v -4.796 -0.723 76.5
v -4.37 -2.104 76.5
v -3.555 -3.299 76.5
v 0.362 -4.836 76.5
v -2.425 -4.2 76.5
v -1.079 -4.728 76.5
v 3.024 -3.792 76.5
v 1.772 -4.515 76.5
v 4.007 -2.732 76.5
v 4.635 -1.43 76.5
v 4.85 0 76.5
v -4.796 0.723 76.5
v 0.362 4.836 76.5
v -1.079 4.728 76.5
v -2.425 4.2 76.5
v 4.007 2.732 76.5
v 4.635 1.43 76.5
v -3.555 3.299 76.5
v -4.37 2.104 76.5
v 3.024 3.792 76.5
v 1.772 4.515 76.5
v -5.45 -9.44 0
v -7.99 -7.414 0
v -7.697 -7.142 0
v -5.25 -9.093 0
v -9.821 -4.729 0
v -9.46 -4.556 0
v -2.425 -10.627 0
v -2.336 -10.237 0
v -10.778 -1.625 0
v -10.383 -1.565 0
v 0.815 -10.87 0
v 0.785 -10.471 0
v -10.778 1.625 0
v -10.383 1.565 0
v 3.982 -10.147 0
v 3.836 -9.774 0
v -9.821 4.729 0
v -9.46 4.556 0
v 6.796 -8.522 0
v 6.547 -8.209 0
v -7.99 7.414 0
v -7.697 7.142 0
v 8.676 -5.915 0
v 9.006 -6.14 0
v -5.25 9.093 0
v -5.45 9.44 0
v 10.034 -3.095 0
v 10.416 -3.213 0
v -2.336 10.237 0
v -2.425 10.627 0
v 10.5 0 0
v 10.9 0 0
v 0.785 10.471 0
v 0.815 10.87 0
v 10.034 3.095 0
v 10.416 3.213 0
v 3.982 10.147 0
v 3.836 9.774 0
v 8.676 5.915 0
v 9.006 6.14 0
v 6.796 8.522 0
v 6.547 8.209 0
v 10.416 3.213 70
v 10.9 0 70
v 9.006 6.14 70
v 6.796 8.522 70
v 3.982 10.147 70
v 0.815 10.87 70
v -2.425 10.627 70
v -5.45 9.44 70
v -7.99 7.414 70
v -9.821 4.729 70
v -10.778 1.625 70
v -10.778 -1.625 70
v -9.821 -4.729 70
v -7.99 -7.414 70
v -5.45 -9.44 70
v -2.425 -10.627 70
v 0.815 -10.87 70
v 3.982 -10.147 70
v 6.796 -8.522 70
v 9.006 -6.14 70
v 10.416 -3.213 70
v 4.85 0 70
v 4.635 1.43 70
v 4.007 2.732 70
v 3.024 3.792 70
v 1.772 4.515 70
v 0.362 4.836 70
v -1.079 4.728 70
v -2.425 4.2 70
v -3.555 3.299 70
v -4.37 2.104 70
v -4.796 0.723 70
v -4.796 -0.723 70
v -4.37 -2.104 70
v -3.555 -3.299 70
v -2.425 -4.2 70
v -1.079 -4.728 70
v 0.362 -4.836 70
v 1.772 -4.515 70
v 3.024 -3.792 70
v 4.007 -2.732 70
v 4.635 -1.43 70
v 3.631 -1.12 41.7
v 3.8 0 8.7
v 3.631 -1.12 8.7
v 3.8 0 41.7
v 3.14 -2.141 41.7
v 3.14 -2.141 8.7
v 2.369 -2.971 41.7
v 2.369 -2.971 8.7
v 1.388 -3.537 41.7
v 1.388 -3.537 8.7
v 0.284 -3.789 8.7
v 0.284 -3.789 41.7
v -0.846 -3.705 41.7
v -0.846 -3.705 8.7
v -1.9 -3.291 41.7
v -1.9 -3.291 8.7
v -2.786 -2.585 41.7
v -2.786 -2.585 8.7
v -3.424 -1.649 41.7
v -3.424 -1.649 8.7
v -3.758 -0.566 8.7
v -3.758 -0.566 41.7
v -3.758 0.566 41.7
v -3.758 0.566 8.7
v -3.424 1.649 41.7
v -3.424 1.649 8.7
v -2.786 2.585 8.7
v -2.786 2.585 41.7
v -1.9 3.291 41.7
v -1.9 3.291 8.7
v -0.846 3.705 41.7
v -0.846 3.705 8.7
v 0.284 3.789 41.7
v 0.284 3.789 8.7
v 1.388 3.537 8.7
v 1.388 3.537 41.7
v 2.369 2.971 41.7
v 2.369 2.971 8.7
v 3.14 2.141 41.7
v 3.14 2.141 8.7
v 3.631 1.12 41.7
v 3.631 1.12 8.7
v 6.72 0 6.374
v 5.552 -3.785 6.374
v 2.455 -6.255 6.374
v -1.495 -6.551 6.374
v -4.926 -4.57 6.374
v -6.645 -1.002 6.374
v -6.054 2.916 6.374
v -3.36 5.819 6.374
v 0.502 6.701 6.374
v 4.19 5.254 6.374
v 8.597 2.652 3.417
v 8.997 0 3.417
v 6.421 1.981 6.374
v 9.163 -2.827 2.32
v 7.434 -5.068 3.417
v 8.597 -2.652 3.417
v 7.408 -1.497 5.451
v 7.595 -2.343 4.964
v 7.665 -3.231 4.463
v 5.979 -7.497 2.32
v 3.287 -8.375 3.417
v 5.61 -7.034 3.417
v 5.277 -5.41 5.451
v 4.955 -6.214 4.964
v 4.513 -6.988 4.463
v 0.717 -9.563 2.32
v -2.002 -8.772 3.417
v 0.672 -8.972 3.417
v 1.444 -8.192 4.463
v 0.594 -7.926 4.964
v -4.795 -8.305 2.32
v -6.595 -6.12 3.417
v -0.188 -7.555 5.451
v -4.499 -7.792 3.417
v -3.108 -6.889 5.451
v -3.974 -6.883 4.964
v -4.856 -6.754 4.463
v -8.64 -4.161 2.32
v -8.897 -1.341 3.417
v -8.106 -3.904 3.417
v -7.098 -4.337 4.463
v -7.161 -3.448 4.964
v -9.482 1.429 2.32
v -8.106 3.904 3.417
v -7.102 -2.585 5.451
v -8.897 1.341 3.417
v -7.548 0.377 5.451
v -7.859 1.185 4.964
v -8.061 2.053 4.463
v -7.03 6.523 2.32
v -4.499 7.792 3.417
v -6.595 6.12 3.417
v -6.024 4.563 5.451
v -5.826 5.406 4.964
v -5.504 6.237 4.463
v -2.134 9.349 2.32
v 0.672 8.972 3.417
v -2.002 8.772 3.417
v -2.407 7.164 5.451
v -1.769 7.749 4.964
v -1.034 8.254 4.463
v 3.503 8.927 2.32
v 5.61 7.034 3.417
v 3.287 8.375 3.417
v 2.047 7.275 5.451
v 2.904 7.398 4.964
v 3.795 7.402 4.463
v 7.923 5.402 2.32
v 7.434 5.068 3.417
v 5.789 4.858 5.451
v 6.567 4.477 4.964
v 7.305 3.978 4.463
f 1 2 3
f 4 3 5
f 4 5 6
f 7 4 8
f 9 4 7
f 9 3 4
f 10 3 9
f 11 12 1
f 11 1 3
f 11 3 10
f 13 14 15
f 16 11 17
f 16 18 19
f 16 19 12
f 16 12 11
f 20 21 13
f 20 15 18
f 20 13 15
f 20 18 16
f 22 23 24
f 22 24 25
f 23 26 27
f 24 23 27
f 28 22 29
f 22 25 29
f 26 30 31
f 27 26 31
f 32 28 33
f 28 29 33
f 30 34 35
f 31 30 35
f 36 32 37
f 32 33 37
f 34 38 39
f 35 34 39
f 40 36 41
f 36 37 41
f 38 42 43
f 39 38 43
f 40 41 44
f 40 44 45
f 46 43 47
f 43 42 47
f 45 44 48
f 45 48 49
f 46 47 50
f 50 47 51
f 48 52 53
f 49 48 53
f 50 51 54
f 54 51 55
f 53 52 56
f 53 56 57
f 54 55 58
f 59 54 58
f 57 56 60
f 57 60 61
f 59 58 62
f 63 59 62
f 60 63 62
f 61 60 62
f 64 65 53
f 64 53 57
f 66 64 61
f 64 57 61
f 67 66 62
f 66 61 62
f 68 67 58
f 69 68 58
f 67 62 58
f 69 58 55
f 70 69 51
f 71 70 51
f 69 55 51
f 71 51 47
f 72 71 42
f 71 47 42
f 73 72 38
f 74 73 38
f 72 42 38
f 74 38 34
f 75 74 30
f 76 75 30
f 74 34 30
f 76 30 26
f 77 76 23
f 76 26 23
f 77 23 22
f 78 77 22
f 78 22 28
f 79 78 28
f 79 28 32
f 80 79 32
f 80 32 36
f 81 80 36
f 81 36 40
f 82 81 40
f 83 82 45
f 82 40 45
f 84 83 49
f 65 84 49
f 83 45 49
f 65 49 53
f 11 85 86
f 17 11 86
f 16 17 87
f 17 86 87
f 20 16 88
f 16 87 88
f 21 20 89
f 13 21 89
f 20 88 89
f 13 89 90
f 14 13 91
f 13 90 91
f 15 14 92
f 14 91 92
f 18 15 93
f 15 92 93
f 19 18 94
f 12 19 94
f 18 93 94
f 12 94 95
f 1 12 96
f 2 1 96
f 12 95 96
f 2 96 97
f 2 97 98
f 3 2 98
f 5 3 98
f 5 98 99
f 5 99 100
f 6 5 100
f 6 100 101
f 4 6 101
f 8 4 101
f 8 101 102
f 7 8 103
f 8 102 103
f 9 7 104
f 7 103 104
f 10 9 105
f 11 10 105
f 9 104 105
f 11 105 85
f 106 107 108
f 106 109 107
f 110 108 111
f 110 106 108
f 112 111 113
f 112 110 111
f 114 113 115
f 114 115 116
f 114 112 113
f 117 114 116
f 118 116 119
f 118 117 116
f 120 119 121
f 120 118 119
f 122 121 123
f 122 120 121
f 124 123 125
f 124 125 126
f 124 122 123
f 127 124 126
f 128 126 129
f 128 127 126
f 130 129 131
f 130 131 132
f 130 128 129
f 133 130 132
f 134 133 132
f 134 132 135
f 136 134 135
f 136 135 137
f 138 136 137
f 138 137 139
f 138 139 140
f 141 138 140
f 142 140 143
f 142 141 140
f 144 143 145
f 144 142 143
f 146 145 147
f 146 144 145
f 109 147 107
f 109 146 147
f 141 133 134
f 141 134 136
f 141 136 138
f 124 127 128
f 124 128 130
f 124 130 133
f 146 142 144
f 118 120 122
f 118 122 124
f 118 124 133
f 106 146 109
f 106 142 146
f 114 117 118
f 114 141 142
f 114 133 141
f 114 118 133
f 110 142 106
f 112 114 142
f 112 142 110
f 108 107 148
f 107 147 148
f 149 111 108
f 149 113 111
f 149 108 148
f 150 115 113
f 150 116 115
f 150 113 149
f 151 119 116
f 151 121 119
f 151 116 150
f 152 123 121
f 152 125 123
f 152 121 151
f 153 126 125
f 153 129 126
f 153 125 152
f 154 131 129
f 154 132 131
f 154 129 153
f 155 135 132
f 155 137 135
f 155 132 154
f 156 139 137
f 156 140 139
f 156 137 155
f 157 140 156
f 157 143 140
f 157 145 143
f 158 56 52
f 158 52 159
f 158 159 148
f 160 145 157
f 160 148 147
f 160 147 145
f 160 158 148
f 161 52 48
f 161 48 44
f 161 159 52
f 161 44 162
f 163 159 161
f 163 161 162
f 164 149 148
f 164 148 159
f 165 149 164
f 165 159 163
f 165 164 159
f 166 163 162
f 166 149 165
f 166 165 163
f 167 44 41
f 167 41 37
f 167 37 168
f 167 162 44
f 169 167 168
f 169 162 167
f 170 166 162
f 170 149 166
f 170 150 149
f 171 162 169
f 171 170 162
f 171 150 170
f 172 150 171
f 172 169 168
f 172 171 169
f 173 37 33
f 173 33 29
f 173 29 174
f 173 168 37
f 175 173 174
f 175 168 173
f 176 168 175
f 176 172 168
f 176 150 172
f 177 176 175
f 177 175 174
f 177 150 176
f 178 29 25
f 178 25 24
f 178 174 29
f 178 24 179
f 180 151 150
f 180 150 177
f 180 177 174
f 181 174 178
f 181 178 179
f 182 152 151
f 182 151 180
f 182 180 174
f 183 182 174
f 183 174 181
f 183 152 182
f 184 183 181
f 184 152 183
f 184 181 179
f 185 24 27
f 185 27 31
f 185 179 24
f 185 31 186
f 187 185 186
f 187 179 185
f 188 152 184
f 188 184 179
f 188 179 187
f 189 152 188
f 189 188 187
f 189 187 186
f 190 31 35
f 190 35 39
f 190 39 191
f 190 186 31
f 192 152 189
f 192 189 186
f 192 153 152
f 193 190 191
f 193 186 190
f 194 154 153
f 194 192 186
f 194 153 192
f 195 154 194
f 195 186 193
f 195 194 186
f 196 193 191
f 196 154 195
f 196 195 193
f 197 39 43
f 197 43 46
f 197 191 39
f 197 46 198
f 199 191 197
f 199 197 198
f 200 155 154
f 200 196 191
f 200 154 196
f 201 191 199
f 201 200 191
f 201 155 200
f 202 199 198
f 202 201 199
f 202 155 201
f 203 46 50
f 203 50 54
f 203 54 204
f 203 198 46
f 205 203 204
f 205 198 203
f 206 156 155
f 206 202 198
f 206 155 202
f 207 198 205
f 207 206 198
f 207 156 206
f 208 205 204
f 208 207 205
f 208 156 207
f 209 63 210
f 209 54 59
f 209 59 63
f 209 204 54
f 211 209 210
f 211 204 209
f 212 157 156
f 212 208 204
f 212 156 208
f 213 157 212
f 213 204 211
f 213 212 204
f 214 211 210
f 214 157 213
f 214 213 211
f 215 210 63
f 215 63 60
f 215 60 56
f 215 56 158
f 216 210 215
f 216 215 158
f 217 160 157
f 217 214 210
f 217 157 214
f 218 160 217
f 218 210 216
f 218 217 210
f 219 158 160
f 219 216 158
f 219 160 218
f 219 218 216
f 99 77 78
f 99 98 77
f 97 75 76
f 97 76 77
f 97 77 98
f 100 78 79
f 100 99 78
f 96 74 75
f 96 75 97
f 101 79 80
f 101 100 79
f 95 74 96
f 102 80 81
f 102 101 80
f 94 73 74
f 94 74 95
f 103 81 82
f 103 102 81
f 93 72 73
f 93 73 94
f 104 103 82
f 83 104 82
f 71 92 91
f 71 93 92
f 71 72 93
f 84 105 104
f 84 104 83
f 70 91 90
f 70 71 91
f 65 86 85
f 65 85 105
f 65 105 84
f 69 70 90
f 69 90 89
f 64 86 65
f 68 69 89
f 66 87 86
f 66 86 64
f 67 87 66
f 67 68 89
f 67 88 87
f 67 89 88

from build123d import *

# Parameters (mm, degrees)
F0_R     = 10.9
F1_DEPTH = 70
F5_R     = 4.85
F6_DEPTH = 6.5


with BuildPart() as f1:
    # F0 (on Top) → F1 (new body)
    with BuildSketch(Plane.XY):
        Circle(F0_R)
    extrude(amount=F1_DEPTH)

    # F2 (on Front) → F3 (revolve, cut)
    with BuildSketch(Plane.XZ):
        with BuildLine():
            Line((0, 41.7), (0, 0))
            Line((0, 0), (10.5, 0))
            ThreePointArc((10.5, 0), (7.947904, 4.964478), (3.8, 8.7))
            Line((3.8, 8.7), (3.8, 41.7))
            Line((3.8, 41.7), (0, 41.7))
        make_face()
    revolve(axis=Axis((0, 0, 20.85), (0, 0, -1)), mode=Mode.SUBTRACT)

    # F5 (on offset) → F6 (join)
    with BuildSketch(Plane.XY.offset(70)):
        Circle(F5_R)
    extrude(amount=F6_DEPTH)


solid = f1.part
